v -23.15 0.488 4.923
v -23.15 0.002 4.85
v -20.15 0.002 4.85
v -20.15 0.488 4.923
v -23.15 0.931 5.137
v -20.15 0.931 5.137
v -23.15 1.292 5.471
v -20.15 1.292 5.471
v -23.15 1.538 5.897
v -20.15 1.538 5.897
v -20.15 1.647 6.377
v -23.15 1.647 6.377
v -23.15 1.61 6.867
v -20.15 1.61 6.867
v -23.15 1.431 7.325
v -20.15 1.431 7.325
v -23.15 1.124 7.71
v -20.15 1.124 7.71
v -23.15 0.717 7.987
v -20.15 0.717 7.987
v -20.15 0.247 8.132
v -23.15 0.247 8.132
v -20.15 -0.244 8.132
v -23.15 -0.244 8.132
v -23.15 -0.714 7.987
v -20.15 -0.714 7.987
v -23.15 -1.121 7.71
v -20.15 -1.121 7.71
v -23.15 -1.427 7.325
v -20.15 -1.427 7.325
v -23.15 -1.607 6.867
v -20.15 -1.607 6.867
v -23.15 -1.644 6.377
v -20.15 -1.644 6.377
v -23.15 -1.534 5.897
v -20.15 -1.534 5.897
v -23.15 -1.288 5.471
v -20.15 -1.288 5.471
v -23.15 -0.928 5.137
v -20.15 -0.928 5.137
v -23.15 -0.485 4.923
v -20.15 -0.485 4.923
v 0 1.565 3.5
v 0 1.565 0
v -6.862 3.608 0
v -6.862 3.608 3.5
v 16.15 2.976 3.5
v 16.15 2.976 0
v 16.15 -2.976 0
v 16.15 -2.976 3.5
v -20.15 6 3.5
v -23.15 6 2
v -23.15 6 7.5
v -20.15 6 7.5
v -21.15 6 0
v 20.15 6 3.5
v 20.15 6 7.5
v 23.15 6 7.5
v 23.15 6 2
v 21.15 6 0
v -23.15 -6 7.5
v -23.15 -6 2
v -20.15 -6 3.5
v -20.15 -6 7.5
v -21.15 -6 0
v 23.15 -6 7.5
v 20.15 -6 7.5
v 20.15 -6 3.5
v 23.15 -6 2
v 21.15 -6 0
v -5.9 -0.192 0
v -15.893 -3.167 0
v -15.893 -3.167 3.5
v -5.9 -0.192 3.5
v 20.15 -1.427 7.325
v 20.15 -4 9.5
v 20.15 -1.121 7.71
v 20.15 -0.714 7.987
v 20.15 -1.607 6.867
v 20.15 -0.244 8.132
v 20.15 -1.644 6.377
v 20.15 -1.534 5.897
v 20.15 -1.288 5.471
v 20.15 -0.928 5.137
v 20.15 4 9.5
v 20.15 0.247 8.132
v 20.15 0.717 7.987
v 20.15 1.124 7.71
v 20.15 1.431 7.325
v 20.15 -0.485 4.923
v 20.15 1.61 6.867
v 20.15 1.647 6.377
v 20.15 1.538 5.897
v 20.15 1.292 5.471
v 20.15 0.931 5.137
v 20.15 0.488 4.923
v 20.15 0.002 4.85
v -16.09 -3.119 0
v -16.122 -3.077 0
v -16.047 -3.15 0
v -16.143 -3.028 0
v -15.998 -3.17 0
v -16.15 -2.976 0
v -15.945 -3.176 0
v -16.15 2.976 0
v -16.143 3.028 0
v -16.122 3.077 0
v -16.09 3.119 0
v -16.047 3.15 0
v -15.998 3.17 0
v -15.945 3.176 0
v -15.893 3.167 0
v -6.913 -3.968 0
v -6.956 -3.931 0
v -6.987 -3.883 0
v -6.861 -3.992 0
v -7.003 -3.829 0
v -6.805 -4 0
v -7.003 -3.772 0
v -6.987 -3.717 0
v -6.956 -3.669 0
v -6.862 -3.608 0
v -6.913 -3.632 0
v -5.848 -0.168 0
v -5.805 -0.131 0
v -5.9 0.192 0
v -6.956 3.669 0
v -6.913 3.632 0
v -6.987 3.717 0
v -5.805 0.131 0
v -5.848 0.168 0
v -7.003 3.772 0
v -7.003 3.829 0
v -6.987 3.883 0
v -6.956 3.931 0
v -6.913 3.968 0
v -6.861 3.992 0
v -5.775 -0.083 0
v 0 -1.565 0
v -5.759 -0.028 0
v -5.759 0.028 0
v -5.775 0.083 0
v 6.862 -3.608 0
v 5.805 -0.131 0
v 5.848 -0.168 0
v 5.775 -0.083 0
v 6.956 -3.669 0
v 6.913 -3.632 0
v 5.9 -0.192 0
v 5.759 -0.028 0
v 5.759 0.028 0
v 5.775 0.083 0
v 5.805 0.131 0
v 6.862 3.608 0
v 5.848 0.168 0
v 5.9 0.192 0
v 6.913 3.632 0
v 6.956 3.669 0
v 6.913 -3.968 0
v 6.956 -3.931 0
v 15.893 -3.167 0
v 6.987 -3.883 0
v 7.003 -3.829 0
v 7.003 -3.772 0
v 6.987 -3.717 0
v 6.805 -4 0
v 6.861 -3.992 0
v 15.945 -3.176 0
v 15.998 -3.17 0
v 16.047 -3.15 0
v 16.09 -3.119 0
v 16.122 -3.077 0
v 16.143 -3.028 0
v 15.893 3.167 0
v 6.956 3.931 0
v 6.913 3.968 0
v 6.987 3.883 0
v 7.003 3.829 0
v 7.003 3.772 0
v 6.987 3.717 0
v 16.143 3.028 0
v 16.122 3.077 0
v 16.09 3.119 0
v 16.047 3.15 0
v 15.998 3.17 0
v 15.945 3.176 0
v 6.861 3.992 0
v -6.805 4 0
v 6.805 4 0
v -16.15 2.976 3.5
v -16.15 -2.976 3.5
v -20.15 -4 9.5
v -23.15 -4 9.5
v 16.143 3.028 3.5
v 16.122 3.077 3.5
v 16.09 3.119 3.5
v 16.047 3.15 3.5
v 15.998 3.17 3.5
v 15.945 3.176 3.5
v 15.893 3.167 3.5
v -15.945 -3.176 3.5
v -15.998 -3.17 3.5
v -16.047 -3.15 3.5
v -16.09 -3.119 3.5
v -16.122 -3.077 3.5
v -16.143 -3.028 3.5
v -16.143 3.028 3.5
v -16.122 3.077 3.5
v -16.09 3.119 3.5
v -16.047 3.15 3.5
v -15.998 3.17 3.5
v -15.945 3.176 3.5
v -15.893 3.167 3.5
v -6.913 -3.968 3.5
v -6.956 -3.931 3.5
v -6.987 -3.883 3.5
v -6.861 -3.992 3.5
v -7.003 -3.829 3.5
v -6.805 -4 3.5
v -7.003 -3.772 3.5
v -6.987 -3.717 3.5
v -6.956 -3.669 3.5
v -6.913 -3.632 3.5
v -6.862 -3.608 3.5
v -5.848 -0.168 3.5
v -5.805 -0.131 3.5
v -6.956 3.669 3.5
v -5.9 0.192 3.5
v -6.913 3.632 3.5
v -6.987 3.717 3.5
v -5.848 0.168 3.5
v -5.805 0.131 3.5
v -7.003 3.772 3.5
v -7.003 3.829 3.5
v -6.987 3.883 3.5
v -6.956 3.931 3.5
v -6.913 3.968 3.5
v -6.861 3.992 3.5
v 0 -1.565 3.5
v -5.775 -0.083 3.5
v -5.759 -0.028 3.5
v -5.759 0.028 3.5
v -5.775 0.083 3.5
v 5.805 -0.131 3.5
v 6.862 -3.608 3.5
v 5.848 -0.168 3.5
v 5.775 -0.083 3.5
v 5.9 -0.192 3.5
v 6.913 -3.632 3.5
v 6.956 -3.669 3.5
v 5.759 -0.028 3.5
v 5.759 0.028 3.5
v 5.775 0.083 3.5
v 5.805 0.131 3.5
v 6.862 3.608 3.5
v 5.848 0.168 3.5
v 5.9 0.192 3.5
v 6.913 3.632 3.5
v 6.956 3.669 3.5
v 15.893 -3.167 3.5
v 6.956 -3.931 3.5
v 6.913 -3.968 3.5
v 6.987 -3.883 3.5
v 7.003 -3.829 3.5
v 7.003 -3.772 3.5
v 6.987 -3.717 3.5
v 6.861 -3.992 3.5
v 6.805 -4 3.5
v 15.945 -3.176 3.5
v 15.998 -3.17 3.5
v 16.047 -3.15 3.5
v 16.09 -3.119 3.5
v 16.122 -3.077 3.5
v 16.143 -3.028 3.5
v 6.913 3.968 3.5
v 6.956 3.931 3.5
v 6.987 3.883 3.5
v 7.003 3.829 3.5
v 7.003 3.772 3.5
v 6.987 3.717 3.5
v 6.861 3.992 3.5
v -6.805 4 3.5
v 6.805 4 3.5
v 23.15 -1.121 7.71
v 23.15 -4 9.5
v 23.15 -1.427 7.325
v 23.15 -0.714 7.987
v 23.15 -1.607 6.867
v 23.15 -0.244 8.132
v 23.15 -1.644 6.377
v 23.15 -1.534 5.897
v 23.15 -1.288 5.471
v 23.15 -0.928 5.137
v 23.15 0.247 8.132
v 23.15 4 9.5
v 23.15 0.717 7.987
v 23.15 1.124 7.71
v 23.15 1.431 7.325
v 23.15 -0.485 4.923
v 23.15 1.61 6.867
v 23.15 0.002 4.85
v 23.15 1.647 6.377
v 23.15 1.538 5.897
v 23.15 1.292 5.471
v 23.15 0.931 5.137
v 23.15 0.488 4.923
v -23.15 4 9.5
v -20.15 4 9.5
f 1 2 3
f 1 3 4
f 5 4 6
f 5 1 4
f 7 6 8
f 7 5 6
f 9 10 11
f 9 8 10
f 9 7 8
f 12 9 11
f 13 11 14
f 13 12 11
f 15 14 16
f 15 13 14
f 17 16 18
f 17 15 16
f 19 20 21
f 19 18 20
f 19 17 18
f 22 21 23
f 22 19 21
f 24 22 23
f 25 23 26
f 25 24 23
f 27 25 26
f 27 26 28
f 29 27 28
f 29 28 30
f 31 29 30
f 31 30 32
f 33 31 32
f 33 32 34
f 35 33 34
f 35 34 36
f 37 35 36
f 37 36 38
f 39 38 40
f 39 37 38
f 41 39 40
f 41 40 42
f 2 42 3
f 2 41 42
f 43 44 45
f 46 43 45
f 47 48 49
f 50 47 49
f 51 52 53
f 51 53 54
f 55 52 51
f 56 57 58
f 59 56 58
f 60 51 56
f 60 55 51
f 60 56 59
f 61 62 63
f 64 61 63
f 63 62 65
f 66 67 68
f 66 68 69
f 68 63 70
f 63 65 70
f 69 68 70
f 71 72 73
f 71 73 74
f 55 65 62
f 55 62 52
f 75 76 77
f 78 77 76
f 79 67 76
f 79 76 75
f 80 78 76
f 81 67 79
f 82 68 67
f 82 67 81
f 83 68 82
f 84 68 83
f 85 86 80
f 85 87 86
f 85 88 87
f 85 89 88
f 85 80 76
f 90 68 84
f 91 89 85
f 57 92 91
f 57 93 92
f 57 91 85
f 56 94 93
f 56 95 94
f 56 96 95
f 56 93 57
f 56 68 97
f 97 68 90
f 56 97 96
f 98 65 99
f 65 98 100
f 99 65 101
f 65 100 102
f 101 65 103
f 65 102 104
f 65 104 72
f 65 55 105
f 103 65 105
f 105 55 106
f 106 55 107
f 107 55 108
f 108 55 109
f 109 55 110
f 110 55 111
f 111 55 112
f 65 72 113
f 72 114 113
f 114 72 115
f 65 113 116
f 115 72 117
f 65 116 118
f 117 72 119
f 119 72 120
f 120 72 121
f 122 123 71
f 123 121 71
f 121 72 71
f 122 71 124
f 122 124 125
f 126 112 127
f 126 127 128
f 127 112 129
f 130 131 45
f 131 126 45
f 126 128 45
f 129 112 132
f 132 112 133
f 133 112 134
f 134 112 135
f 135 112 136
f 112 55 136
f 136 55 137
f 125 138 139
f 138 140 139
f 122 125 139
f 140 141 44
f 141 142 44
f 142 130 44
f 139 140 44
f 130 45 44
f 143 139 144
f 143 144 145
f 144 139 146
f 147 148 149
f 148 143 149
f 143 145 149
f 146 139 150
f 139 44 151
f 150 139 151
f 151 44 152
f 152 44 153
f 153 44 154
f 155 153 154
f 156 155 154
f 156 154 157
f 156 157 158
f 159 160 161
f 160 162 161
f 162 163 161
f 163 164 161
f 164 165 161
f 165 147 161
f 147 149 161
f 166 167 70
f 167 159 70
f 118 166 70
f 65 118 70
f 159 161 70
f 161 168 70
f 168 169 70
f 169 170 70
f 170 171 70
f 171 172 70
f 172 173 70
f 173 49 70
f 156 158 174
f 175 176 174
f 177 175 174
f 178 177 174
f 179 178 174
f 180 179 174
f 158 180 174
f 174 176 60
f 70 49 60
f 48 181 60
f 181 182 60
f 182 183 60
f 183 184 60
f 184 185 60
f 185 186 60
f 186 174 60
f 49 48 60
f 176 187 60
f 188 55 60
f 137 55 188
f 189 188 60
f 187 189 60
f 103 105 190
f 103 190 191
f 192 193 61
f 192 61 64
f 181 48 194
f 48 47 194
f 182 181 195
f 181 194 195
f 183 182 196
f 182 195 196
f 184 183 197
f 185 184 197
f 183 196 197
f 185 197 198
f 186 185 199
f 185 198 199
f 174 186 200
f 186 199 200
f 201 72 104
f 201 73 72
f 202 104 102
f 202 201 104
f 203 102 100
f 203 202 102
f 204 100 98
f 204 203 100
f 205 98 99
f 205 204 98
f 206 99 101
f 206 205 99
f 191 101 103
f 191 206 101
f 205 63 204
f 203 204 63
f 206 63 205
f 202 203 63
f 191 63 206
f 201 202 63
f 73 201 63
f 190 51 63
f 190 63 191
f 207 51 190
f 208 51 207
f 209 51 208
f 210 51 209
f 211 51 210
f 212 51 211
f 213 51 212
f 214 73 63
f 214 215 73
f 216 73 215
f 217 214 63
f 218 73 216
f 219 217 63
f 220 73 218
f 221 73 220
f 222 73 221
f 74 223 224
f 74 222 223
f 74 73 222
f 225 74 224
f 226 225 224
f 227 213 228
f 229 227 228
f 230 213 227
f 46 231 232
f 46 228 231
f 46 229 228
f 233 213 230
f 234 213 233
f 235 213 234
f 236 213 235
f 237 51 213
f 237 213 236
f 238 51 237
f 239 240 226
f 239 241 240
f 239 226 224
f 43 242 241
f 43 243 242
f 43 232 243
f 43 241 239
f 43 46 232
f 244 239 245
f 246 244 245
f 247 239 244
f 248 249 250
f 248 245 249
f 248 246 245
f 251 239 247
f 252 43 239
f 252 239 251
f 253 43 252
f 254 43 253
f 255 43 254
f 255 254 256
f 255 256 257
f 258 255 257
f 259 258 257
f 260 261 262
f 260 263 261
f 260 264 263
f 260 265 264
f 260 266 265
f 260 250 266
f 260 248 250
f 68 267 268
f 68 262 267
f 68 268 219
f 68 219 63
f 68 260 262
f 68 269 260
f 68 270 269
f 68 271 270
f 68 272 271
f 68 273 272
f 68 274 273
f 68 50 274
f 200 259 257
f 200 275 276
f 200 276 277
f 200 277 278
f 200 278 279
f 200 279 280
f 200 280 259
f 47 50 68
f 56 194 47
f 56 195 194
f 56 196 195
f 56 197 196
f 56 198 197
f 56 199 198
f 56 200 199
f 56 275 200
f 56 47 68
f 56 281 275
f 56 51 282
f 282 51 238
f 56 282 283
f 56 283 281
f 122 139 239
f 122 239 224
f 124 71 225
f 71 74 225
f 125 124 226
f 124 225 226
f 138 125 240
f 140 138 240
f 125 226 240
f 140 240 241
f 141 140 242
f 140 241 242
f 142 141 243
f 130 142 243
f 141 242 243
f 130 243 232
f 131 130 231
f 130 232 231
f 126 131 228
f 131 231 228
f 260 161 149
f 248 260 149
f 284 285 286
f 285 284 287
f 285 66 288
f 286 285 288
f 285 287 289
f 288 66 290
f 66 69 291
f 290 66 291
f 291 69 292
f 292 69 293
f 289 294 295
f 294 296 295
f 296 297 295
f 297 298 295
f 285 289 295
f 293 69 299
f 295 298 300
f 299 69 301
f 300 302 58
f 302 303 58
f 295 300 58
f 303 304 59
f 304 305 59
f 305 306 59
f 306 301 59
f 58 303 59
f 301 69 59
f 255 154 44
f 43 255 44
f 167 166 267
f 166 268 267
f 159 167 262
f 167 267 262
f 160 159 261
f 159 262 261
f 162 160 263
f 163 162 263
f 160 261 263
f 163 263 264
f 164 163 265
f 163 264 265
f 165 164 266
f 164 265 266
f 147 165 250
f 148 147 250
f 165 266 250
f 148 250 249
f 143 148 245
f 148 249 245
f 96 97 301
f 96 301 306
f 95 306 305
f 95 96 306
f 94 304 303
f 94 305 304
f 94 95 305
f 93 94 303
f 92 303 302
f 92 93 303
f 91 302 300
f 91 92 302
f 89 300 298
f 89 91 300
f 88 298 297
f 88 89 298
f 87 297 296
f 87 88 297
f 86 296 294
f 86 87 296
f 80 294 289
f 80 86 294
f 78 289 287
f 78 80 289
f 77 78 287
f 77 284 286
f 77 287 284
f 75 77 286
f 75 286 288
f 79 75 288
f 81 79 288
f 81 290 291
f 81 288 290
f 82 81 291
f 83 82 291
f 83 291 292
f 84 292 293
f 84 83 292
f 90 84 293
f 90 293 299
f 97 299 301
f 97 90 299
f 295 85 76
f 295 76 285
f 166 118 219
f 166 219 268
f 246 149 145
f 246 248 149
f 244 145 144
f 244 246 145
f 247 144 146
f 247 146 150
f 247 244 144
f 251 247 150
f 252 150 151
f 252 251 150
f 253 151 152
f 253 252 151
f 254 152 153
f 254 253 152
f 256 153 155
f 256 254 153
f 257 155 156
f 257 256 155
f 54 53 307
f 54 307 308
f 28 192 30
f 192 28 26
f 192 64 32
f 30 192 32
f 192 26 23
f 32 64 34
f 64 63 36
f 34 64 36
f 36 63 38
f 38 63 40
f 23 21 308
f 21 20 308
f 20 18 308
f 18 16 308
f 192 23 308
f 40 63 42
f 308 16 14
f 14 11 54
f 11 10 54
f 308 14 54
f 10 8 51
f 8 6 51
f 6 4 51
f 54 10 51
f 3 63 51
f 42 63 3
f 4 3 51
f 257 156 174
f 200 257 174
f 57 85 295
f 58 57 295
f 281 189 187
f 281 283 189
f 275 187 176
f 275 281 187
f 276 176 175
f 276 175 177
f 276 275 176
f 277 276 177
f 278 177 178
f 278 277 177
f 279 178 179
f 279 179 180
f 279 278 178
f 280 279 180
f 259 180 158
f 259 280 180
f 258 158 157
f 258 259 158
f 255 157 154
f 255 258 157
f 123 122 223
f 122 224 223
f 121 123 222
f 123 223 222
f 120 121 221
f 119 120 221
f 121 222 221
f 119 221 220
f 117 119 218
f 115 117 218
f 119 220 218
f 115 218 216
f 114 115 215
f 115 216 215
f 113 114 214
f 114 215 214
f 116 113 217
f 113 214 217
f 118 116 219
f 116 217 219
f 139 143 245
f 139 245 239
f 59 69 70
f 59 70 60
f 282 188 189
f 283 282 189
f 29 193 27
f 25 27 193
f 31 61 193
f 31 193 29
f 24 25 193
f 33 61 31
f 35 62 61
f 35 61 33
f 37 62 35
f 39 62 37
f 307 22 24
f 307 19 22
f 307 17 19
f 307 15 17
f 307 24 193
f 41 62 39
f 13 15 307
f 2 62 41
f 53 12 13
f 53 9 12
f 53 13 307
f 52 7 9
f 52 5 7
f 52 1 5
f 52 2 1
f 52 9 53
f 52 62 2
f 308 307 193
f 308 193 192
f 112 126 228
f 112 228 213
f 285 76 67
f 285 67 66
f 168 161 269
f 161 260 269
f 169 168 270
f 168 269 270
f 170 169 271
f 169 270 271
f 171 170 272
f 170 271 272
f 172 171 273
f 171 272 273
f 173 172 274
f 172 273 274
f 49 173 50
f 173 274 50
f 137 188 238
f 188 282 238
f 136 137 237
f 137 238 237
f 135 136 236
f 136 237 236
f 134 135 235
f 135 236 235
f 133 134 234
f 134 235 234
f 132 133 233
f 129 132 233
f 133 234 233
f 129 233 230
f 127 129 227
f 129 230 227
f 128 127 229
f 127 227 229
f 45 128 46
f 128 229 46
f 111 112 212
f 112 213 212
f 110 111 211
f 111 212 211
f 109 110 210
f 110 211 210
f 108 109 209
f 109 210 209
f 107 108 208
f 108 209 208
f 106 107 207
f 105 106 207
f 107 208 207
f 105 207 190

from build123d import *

# Parameters (mm, degrees)
SKETCH_1_W               = 46.3
SKETCH_1_H               = 12
EXTRUDE_1_DEPTH          = 3.5
SKETCH_2_W               = 3
SKETCH_2_H               = 12
EXTRUDE_2_DEPTH          = 6
CUT_EXTRUDE_1_DEPTH      = 45.734103322
CUT_EXTRUDE_1_DEPTH_BACK = 45.734103322
SKETCH_3_R               = 1.65
CHAMFER_1_SIZE           = 2
CHAMFER_2_SIZE           = 2
CUT_EXTRUDE_2_DEPTH      = 25.656084442
CUT_EXTRUDE_2_DEPTH_BACK = 25.656084442
FILLET_1_R               = 0.2


with BuildPart() as part:
    # 草图1 → 凸台-拉伸1 (new body)
    with BuildSketch(Plane.XY):
        Rectangle(SKETCH_1_W, SKETCH_1_H)
    extrude(amount=EXTRUDE_1_DEPTH)

    # 草图2 → 凸台-拉伸2 (add)
    with BuildSketch(Plane.XY.offset(3.5)):
        with Locations((-21.65, 0)):
            Rectangle(SKETCH_2_W, SKETCH_2_H)
        with Locations((21.65, 0)):
            Rectangle(SKETCH_2_W, SKETCH_2_H)
    extrude(amount=EXTRUDE_2_DEPTH)

    # 草图3 → 切除-拉伸1 (cut, two sides: drawn at the far end of the back side and taken through both)
    with BuildSketch(Plane(origin=(-20.15, 0, 0), x_dir=(0, 0, -1), z_dir=(1, 0, 0)).offset(-CUT_EXTRUDE_1_DEPTH_BACK)):
        with Locations((-6.5, 0.001559283)):
            Circle(SKETCH_3_R)
    extrude(amount=CUT_EXTRUDE_1_DEPTH + CUT_EXTRUDE_1_DEPTH_BACK, mode=Mode.SUBTRACT)

    # 倒角1
    chamfer_1_edges = [part.edges().sort_by_distance(p)[0] for p in [
        (-23.15, 0, 0),
        (23.15, 0, 0),
    ]]
    chamfer(chamfer_1_edges, length=CHAMFER_1_SIZE)

    # 倒角2
    chamfer_2_edges = [part.edges().sort_by_distance(p)[0] for p in [
        (-21.65, -6, 9.5),
        (-21.65, 6, 9.5),
        (21.65, 6, 9.5),
        (21.65, -6, 9.5),
    ]]
    chamfer(chamfer_2_edges, length=CHAMFER_2_SIZE)

    # 草图4 → 切除-拉伸2 (cut, two sides: drawn at the far end of the back side and taken through both)
    with BuildSketch(Plane.XY.offset(3.5).offset(-CUT_EXTRUDE_2_DEPTH_BACK)):
        Polygon((-8.177250548, 4), (8.177250548, 4), (0, 1.565086686), align=None)
        Polygon((-16.15, 3.243846317), (-16.15, -3.243846317), (-5.256082786, 0), align=None)
        Polygon((8.177250548, -4), (0, -1.565086686), (-8.177250548, -4), align=None)
        Polygon((16.15, -3.243846317), (5.256082786, 0), (16.15, 3.243846317), align=None)
    extrude(amount=CUT_EXTRUDE_2_DEPTH + CUT_EXTRUDE_2_DEPTH_BACK, mode=Mode.SUBTRACT)

    # 圆角1
    fillet_1_edges = [part.edges().sort_by_distance(p)[0] for p in [
        (-8.177250548, 4, 1.75),
        (8.177250548, 4, 1.75),
        (8.177250548, -4, 1.75),
        (-8.177250548, -4, 1.75),
        (16.15, 3.243846317, 1.75),
        (16.15, -3.243846317, 1.75),
        (5.256082786, 0, 1.75),
        (-16.15, 3.243846317, 1.75),
        (-5.256082786, 0, 1.75),
        (-16.15, -3.243846317, 1.75),
    ]]
    fillet(fillet_1_edges, radius=FILLET_1_R)


solid = part.part
